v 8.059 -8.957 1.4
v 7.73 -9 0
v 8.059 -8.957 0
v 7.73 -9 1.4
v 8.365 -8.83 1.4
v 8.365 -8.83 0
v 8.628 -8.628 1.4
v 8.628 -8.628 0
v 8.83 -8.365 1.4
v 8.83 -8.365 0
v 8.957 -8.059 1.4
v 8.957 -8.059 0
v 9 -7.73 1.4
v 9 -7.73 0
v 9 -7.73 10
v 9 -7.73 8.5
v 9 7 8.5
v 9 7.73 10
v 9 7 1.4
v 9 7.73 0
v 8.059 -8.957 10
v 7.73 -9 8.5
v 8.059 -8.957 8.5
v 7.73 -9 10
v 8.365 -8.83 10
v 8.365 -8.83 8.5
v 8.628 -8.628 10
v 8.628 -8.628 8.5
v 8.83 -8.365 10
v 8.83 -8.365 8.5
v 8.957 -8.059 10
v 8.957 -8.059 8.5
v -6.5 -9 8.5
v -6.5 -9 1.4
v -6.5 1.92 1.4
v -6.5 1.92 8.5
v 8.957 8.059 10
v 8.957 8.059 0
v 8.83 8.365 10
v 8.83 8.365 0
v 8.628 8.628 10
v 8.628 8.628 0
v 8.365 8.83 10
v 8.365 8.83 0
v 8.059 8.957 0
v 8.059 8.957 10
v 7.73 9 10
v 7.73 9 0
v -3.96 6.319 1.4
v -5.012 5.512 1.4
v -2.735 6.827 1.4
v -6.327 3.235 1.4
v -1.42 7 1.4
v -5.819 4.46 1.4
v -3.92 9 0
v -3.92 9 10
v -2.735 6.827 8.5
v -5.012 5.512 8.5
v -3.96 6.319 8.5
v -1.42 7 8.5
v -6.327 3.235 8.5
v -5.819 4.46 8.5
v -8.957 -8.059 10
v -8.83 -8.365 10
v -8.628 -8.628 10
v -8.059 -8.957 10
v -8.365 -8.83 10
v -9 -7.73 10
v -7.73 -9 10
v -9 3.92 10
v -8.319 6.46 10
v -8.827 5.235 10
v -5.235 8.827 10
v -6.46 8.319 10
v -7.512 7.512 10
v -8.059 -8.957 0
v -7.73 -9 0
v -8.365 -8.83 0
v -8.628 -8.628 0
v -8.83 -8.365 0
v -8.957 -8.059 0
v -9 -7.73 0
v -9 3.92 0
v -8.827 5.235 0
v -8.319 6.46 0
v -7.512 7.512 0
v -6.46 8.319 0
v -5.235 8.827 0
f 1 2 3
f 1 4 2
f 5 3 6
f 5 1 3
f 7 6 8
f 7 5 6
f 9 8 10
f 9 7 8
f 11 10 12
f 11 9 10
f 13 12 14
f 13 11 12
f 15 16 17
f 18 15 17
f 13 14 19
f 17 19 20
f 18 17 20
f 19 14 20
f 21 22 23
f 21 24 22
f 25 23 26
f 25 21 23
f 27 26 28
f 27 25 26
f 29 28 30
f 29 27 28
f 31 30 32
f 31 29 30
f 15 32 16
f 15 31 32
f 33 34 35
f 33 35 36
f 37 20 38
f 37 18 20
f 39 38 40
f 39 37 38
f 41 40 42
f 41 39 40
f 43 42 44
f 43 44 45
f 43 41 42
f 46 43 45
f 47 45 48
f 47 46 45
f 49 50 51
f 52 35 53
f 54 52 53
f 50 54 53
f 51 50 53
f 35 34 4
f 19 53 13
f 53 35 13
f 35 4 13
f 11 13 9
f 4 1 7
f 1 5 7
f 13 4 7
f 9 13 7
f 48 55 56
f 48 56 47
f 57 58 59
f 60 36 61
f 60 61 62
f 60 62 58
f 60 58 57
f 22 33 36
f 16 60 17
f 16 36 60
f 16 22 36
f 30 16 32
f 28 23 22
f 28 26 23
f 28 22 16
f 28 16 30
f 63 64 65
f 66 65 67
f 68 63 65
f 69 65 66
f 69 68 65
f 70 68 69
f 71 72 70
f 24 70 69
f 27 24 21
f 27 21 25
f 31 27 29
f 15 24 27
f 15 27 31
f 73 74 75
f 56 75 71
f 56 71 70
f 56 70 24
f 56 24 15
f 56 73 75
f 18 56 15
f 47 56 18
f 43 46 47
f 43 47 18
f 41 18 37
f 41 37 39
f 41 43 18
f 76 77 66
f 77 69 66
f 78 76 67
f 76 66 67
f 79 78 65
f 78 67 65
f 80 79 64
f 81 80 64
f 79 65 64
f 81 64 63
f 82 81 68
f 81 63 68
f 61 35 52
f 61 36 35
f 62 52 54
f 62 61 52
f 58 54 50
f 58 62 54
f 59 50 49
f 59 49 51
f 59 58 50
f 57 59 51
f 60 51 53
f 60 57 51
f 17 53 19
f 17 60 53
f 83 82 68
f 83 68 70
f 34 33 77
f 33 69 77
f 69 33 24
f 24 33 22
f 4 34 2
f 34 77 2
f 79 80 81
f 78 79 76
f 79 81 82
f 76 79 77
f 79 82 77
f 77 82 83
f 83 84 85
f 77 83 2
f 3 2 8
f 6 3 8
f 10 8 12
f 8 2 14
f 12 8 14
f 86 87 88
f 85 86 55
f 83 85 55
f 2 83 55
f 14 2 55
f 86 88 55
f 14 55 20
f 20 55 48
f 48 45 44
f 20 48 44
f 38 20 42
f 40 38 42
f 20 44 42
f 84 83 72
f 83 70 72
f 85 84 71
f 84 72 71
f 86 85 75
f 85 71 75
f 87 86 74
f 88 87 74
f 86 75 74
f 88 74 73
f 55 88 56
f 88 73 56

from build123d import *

# Parameters (mm, degrees)
F0_W     = 18
F0_H     = 18
F1_DEPTH = 10
F2_W     = 15.5
F2_H     = 7.1
F3_DEPTH = 16
F4_R     = 5.08
F5_R     = 5.08
F6_R     = 1.27


with BuildPart() as f1:
    # F0 (on Top) → F1 (new body)
    with BuildSketch(Plane.XY):
        Rectangle(F0_W, F0_H)
    extrude(amount=F1_DEPTH)

    # F2 (on face) → F3 (cut)
    with BuildSketch(Plane.XZ.offset(9)):
        with Locations((1.25, 4.95)):
            Rectangle(F2_W, F2_H)
    extrude(amount=-F3_DEPTH, mode=Mode.SUBTRACT)

    # F4
    f4_edges = [f1.edges().sort_by_distance(p)[0] for p in [
        (-9, 9, 5),
    ]]
    fillet(f4_edges, radius=F4_R)

    # F5
    f5_edges = [f1.edges().sort_by_distance(p)[0] for p in [
        (-6.5, 7, 4.95),
    ]]
    fillet(f5_edges, radius=F5_R)

    # F6
    f6_edges = [f1.edges().sort_by_distance(p)[0] for p in [
        (-9, -9, 5),
        (9, 9, 5),
        (9, -9, 0.7),
        (9, -9, 9.25),
    ]]
    fillet(f6_edges, radius=F6_R)


solid = f1.part
